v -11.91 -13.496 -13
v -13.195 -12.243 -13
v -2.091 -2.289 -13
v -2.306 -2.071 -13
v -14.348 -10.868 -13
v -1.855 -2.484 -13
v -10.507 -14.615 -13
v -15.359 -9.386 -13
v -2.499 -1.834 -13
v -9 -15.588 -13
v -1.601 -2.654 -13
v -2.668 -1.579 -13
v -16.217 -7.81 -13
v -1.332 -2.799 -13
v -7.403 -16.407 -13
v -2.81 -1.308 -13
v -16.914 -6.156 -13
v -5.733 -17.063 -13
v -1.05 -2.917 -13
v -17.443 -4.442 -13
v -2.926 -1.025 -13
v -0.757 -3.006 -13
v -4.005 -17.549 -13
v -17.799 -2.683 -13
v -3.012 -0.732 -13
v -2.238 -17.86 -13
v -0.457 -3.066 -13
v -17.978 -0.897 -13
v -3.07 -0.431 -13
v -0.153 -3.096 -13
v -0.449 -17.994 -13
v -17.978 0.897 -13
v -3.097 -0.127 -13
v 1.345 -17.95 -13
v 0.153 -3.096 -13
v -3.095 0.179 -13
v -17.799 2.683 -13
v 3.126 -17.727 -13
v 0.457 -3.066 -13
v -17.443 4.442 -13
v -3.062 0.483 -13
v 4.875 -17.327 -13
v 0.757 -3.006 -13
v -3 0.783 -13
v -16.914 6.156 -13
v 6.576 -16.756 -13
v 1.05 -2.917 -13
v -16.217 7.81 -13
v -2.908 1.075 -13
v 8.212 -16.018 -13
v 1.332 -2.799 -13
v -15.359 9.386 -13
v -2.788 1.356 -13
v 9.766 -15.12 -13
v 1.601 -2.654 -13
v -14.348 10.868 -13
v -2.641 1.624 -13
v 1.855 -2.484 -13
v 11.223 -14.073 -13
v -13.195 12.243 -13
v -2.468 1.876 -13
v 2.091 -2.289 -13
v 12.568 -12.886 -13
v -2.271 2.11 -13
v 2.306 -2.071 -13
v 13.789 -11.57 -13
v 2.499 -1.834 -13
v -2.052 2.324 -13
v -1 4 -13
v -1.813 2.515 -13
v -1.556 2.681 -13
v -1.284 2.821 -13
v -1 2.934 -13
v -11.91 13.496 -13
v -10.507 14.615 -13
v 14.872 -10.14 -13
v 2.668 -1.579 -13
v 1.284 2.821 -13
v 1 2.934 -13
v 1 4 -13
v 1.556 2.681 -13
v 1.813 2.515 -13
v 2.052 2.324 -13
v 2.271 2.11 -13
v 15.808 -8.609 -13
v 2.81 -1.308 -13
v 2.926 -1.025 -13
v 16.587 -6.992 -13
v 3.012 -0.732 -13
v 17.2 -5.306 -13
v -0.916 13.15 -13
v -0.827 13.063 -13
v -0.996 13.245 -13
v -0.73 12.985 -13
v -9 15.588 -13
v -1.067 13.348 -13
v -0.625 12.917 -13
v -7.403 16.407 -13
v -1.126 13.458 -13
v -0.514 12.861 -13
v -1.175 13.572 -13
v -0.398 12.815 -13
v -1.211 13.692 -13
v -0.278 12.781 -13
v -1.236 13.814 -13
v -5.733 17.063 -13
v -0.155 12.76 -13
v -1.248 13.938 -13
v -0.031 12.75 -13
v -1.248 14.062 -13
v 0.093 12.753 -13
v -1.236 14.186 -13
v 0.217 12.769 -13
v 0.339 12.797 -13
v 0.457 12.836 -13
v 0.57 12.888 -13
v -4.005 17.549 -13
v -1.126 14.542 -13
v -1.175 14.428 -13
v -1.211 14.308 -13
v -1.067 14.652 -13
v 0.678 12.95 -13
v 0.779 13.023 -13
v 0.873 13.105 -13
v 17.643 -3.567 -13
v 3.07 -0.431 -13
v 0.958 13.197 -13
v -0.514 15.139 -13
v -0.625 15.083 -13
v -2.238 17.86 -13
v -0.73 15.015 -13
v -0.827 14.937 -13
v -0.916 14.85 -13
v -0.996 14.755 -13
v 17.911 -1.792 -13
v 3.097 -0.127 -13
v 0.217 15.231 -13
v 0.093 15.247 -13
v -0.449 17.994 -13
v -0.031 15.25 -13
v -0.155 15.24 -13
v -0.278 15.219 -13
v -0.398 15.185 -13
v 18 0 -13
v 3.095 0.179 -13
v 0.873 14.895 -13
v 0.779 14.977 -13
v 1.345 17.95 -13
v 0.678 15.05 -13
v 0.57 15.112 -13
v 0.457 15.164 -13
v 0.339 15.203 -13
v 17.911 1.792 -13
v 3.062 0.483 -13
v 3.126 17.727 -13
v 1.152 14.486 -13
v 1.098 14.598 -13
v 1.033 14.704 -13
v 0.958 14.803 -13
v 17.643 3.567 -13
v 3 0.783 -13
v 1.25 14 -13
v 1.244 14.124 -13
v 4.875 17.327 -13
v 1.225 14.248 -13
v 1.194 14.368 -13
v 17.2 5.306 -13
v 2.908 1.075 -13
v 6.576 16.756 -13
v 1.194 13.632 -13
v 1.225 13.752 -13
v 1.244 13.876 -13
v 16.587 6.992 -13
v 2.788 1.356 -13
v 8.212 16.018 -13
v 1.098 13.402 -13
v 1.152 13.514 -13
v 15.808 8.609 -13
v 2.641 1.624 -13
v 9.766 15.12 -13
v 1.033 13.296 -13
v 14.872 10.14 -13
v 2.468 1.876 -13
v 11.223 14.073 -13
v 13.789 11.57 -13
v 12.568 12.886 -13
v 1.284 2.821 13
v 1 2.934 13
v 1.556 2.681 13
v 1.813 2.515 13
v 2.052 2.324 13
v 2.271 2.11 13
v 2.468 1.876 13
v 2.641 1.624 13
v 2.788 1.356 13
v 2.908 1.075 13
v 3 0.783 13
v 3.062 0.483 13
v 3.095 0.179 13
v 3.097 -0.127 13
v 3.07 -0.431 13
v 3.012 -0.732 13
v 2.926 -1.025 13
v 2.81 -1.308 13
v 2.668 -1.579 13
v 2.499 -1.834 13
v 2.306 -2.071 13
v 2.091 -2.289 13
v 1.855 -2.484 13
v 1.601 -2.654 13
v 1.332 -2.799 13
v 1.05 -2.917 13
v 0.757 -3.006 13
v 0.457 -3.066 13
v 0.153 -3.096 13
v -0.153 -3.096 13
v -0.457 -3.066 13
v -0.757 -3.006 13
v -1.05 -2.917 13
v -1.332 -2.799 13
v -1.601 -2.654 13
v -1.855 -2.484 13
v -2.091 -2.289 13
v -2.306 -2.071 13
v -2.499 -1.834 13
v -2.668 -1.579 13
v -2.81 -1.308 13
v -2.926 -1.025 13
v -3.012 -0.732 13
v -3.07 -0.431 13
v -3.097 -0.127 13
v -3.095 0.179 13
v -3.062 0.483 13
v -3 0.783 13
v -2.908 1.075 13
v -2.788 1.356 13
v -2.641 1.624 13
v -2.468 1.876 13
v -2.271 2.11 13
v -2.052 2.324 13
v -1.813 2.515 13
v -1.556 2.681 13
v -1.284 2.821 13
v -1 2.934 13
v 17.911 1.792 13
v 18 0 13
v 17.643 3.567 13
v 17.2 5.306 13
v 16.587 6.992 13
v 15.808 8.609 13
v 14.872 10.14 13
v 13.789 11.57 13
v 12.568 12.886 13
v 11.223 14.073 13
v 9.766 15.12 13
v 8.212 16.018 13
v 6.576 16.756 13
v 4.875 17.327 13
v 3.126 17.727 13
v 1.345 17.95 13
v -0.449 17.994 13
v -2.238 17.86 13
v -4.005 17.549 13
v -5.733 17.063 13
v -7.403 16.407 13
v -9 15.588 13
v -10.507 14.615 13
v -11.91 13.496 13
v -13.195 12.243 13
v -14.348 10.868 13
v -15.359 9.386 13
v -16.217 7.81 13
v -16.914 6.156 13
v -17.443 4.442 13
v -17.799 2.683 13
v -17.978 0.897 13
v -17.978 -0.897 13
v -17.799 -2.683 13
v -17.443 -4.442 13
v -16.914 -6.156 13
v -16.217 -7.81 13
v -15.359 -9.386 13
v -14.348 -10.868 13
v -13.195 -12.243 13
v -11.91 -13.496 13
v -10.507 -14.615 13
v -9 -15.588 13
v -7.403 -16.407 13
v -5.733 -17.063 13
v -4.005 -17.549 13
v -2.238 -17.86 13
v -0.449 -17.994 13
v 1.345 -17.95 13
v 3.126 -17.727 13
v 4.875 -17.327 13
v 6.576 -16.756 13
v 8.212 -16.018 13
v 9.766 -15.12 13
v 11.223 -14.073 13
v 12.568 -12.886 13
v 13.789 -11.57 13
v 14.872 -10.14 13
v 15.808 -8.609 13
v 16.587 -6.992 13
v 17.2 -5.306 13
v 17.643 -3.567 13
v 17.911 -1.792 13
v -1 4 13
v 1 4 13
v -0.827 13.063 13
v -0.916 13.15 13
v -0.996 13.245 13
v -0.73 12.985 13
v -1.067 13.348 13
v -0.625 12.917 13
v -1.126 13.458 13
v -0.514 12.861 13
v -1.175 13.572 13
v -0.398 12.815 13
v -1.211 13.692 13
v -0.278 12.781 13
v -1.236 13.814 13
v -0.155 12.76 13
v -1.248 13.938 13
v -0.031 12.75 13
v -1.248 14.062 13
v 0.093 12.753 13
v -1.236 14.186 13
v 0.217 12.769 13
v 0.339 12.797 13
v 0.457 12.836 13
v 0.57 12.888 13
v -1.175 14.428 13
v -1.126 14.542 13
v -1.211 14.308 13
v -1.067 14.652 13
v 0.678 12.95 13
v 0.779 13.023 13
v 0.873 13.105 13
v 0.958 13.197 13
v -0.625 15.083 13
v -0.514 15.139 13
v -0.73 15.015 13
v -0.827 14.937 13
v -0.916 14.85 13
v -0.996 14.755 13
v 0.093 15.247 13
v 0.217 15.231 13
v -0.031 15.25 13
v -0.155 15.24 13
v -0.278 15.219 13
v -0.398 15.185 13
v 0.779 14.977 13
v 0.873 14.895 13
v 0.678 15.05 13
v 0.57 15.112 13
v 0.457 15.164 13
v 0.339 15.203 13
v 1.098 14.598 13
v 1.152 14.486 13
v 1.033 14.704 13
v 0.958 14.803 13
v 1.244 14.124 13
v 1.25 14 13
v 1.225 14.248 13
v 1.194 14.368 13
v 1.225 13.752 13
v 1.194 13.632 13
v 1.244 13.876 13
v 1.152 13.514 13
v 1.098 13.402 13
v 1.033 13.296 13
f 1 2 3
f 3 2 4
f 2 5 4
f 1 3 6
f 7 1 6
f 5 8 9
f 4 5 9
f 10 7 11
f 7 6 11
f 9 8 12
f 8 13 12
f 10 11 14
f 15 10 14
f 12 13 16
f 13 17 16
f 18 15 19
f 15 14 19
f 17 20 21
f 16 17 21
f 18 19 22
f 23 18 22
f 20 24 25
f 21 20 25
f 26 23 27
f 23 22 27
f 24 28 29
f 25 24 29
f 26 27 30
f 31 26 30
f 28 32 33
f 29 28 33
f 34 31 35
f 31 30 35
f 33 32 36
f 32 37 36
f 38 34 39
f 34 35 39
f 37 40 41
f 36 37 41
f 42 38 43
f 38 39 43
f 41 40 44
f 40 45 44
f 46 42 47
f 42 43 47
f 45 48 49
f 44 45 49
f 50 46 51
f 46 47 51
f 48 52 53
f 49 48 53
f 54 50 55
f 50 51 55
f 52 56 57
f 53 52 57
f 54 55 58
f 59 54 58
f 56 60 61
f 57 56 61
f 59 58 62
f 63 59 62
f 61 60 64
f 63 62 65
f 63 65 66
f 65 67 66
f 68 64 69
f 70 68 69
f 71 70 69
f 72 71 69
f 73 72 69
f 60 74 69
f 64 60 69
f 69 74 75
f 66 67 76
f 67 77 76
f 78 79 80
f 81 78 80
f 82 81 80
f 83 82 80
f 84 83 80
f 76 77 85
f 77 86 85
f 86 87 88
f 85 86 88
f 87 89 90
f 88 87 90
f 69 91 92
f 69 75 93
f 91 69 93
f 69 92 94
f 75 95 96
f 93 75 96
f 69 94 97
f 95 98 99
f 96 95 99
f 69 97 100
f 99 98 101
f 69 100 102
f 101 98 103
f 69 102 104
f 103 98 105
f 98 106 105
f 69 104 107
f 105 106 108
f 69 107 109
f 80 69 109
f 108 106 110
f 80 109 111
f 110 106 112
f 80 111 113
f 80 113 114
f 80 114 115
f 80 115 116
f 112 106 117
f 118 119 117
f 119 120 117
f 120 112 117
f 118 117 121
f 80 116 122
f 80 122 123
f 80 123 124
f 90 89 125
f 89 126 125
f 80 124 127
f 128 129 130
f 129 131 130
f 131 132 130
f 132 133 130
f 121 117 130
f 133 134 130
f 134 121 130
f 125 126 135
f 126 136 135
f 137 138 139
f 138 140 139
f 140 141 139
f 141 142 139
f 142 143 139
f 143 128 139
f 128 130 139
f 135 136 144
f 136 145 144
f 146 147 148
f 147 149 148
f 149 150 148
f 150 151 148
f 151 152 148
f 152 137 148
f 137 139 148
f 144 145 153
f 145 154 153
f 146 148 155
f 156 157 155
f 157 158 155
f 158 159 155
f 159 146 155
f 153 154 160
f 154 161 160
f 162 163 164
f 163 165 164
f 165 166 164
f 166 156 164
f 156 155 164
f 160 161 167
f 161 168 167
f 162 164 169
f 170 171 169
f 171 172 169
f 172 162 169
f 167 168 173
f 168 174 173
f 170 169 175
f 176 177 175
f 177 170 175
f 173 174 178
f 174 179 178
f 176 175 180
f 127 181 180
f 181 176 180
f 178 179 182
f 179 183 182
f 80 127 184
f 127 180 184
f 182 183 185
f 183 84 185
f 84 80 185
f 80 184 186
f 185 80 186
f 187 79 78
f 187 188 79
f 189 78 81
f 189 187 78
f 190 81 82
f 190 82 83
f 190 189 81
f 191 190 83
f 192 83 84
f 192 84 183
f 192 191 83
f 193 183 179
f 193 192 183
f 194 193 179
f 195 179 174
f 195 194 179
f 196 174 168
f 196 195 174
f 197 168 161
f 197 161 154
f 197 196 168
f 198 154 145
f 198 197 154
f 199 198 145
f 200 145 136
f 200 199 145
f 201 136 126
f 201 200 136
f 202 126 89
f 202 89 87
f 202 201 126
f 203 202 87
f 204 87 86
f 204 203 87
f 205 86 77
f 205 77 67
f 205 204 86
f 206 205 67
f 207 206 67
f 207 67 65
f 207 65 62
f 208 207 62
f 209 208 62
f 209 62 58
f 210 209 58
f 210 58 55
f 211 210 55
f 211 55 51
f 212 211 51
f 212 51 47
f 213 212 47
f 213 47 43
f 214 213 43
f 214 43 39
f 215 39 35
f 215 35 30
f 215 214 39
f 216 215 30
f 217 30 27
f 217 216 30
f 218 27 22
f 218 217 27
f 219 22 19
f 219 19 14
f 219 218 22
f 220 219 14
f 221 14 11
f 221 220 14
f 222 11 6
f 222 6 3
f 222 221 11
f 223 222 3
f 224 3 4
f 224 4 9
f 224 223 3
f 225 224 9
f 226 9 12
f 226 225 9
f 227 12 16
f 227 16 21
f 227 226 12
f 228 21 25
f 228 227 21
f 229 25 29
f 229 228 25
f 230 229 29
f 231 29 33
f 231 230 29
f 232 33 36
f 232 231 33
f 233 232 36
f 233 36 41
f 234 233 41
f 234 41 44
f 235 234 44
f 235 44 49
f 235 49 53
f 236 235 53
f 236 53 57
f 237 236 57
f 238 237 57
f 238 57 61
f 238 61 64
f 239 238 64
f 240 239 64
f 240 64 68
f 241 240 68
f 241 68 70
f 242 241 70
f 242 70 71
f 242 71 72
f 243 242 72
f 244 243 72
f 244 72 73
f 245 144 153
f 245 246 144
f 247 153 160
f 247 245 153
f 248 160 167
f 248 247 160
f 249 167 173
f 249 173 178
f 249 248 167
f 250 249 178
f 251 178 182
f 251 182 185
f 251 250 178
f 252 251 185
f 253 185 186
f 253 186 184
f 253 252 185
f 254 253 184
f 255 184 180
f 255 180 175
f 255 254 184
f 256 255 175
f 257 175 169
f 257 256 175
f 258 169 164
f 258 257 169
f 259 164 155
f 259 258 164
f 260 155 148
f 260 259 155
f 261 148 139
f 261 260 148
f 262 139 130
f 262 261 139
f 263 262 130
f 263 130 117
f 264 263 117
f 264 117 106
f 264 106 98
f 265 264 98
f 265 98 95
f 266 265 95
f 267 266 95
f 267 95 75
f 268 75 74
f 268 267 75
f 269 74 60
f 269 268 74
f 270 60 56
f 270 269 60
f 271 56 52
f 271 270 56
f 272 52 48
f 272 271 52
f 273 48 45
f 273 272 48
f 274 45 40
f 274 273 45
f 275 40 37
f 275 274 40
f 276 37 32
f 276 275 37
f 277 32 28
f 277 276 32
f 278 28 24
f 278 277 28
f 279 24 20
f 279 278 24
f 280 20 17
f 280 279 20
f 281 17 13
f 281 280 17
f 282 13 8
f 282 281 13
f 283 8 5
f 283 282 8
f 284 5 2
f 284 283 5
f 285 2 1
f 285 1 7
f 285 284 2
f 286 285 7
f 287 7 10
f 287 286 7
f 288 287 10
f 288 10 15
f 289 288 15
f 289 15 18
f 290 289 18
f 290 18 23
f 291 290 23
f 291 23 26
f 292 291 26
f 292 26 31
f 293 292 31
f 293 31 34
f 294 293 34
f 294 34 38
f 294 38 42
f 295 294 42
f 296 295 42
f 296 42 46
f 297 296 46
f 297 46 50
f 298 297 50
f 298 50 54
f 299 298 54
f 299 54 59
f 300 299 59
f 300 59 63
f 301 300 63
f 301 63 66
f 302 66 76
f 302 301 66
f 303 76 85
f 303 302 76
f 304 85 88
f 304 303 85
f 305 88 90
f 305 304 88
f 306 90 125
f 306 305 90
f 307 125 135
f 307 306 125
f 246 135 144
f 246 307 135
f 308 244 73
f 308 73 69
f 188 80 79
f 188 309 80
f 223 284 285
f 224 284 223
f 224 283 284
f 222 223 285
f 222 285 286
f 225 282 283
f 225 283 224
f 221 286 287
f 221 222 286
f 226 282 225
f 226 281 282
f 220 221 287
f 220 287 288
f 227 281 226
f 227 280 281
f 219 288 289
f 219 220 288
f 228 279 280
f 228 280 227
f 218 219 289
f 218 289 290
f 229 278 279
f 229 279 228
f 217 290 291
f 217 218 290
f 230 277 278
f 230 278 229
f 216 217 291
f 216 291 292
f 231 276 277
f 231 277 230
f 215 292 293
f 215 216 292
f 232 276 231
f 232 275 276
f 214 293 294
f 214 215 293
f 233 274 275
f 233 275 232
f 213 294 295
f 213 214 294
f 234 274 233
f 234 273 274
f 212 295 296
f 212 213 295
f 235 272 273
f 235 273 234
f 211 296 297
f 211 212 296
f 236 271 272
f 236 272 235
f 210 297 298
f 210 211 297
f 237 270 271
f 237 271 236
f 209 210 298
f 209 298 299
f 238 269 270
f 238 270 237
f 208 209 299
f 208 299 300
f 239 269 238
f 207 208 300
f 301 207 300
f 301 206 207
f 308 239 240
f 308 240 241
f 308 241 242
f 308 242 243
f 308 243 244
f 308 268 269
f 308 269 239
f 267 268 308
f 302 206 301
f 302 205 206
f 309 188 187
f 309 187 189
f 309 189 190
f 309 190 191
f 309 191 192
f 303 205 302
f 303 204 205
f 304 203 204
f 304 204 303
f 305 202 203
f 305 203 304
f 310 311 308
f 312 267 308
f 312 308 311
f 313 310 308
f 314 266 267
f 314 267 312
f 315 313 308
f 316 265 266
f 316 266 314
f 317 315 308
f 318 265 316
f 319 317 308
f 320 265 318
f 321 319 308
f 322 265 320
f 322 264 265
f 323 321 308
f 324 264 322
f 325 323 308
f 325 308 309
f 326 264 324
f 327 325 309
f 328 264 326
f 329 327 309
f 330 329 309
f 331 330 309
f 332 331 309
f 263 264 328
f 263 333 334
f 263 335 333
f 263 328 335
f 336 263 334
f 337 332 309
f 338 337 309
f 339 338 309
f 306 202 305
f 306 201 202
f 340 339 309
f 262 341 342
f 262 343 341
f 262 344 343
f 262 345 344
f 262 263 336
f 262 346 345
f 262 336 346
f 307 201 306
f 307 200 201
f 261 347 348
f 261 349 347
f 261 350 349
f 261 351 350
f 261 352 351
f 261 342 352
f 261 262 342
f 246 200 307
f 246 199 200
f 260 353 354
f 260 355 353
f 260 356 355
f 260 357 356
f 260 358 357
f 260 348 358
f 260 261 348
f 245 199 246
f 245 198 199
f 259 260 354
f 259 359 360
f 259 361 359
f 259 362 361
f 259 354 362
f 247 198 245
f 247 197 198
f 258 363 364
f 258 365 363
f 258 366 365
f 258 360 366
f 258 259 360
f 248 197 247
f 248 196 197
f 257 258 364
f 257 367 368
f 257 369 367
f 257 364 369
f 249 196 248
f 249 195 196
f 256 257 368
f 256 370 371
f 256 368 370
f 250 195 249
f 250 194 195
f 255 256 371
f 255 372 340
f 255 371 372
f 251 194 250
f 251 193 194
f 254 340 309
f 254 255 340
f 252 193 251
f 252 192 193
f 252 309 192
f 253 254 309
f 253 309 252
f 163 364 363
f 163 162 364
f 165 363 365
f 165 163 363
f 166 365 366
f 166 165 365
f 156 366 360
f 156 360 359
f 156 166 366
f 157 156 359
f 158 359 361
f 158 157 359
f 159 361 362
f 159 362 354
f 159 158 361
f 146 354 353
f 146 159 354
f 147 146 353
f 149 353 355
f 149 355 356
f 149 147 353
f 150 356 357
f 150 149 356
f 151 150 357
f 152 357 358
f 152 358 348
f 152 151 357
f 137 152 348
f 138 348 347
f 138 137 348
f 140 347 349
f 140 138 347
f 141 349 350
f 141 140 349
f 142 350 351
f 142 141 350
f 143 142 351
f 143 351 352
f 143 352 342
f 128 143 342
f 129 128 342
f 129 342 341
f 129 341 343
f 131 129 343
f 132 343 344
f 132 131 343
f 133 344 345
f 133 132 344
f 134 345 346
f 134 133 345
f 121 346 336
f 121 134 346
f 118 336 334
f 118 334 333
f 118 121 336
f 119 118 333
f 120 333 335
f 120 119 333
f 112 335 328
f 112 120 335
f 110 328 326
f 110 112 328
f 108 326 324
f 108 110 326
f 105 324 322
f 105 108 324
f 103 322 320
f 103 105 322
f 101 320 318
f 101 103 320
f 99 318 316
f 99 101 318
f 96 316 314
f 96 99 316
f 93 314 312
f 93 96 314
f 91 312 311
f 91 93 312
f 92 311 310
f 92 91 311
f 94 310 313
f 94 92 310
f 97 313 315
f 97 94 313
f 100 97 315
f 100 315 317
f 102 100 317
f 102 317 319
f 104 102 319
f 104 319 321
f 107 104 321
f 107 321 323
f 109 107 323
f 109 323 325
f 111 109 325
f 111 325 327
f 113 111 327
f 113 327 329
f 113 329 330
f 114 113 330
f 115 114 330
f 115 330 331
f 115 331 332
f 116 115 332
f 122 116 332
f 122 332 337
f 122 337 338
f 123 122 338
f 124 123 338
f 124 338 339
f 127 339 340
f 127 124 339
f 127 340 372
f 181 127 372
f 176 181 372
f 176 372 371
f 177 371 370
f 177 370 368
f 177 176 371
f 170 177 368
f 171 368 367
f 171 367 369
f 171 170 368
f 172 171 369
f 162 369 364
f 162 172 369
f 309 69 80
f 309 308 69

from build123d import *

# Parameters (mm, degrees)
SKETCH_1_R      = 18
SKETCH_1_R_2    = 1.25
EXTRUDE_1_DEPTH = 13


with BuildPart() as part:
    # 草图1 → 凸台-拉伸1 (new, symmetric)
    with BuildSketch(Plane.XY):
        Circle(SKETCH_1_R)
        with Locations((0, 14)):
            Circle(SKETCH_1_R_2, mode=Mode.SUBTRACT)
        with BuildLine():
            Line((-1, 2.93428015), (-1, 4))
            Line((-1, 4), (1, 4))
            Line((1, 4), (1, 2.93428015))
            ThreePointArc((1, 2.93428015), (0, -3.1), (-1, 2.93428015))
        make_face(mode=Mode.SUBTRACT)
    extrude(amount=EXTRUDE_1_DEPTH, both=True)


solid = part.part
